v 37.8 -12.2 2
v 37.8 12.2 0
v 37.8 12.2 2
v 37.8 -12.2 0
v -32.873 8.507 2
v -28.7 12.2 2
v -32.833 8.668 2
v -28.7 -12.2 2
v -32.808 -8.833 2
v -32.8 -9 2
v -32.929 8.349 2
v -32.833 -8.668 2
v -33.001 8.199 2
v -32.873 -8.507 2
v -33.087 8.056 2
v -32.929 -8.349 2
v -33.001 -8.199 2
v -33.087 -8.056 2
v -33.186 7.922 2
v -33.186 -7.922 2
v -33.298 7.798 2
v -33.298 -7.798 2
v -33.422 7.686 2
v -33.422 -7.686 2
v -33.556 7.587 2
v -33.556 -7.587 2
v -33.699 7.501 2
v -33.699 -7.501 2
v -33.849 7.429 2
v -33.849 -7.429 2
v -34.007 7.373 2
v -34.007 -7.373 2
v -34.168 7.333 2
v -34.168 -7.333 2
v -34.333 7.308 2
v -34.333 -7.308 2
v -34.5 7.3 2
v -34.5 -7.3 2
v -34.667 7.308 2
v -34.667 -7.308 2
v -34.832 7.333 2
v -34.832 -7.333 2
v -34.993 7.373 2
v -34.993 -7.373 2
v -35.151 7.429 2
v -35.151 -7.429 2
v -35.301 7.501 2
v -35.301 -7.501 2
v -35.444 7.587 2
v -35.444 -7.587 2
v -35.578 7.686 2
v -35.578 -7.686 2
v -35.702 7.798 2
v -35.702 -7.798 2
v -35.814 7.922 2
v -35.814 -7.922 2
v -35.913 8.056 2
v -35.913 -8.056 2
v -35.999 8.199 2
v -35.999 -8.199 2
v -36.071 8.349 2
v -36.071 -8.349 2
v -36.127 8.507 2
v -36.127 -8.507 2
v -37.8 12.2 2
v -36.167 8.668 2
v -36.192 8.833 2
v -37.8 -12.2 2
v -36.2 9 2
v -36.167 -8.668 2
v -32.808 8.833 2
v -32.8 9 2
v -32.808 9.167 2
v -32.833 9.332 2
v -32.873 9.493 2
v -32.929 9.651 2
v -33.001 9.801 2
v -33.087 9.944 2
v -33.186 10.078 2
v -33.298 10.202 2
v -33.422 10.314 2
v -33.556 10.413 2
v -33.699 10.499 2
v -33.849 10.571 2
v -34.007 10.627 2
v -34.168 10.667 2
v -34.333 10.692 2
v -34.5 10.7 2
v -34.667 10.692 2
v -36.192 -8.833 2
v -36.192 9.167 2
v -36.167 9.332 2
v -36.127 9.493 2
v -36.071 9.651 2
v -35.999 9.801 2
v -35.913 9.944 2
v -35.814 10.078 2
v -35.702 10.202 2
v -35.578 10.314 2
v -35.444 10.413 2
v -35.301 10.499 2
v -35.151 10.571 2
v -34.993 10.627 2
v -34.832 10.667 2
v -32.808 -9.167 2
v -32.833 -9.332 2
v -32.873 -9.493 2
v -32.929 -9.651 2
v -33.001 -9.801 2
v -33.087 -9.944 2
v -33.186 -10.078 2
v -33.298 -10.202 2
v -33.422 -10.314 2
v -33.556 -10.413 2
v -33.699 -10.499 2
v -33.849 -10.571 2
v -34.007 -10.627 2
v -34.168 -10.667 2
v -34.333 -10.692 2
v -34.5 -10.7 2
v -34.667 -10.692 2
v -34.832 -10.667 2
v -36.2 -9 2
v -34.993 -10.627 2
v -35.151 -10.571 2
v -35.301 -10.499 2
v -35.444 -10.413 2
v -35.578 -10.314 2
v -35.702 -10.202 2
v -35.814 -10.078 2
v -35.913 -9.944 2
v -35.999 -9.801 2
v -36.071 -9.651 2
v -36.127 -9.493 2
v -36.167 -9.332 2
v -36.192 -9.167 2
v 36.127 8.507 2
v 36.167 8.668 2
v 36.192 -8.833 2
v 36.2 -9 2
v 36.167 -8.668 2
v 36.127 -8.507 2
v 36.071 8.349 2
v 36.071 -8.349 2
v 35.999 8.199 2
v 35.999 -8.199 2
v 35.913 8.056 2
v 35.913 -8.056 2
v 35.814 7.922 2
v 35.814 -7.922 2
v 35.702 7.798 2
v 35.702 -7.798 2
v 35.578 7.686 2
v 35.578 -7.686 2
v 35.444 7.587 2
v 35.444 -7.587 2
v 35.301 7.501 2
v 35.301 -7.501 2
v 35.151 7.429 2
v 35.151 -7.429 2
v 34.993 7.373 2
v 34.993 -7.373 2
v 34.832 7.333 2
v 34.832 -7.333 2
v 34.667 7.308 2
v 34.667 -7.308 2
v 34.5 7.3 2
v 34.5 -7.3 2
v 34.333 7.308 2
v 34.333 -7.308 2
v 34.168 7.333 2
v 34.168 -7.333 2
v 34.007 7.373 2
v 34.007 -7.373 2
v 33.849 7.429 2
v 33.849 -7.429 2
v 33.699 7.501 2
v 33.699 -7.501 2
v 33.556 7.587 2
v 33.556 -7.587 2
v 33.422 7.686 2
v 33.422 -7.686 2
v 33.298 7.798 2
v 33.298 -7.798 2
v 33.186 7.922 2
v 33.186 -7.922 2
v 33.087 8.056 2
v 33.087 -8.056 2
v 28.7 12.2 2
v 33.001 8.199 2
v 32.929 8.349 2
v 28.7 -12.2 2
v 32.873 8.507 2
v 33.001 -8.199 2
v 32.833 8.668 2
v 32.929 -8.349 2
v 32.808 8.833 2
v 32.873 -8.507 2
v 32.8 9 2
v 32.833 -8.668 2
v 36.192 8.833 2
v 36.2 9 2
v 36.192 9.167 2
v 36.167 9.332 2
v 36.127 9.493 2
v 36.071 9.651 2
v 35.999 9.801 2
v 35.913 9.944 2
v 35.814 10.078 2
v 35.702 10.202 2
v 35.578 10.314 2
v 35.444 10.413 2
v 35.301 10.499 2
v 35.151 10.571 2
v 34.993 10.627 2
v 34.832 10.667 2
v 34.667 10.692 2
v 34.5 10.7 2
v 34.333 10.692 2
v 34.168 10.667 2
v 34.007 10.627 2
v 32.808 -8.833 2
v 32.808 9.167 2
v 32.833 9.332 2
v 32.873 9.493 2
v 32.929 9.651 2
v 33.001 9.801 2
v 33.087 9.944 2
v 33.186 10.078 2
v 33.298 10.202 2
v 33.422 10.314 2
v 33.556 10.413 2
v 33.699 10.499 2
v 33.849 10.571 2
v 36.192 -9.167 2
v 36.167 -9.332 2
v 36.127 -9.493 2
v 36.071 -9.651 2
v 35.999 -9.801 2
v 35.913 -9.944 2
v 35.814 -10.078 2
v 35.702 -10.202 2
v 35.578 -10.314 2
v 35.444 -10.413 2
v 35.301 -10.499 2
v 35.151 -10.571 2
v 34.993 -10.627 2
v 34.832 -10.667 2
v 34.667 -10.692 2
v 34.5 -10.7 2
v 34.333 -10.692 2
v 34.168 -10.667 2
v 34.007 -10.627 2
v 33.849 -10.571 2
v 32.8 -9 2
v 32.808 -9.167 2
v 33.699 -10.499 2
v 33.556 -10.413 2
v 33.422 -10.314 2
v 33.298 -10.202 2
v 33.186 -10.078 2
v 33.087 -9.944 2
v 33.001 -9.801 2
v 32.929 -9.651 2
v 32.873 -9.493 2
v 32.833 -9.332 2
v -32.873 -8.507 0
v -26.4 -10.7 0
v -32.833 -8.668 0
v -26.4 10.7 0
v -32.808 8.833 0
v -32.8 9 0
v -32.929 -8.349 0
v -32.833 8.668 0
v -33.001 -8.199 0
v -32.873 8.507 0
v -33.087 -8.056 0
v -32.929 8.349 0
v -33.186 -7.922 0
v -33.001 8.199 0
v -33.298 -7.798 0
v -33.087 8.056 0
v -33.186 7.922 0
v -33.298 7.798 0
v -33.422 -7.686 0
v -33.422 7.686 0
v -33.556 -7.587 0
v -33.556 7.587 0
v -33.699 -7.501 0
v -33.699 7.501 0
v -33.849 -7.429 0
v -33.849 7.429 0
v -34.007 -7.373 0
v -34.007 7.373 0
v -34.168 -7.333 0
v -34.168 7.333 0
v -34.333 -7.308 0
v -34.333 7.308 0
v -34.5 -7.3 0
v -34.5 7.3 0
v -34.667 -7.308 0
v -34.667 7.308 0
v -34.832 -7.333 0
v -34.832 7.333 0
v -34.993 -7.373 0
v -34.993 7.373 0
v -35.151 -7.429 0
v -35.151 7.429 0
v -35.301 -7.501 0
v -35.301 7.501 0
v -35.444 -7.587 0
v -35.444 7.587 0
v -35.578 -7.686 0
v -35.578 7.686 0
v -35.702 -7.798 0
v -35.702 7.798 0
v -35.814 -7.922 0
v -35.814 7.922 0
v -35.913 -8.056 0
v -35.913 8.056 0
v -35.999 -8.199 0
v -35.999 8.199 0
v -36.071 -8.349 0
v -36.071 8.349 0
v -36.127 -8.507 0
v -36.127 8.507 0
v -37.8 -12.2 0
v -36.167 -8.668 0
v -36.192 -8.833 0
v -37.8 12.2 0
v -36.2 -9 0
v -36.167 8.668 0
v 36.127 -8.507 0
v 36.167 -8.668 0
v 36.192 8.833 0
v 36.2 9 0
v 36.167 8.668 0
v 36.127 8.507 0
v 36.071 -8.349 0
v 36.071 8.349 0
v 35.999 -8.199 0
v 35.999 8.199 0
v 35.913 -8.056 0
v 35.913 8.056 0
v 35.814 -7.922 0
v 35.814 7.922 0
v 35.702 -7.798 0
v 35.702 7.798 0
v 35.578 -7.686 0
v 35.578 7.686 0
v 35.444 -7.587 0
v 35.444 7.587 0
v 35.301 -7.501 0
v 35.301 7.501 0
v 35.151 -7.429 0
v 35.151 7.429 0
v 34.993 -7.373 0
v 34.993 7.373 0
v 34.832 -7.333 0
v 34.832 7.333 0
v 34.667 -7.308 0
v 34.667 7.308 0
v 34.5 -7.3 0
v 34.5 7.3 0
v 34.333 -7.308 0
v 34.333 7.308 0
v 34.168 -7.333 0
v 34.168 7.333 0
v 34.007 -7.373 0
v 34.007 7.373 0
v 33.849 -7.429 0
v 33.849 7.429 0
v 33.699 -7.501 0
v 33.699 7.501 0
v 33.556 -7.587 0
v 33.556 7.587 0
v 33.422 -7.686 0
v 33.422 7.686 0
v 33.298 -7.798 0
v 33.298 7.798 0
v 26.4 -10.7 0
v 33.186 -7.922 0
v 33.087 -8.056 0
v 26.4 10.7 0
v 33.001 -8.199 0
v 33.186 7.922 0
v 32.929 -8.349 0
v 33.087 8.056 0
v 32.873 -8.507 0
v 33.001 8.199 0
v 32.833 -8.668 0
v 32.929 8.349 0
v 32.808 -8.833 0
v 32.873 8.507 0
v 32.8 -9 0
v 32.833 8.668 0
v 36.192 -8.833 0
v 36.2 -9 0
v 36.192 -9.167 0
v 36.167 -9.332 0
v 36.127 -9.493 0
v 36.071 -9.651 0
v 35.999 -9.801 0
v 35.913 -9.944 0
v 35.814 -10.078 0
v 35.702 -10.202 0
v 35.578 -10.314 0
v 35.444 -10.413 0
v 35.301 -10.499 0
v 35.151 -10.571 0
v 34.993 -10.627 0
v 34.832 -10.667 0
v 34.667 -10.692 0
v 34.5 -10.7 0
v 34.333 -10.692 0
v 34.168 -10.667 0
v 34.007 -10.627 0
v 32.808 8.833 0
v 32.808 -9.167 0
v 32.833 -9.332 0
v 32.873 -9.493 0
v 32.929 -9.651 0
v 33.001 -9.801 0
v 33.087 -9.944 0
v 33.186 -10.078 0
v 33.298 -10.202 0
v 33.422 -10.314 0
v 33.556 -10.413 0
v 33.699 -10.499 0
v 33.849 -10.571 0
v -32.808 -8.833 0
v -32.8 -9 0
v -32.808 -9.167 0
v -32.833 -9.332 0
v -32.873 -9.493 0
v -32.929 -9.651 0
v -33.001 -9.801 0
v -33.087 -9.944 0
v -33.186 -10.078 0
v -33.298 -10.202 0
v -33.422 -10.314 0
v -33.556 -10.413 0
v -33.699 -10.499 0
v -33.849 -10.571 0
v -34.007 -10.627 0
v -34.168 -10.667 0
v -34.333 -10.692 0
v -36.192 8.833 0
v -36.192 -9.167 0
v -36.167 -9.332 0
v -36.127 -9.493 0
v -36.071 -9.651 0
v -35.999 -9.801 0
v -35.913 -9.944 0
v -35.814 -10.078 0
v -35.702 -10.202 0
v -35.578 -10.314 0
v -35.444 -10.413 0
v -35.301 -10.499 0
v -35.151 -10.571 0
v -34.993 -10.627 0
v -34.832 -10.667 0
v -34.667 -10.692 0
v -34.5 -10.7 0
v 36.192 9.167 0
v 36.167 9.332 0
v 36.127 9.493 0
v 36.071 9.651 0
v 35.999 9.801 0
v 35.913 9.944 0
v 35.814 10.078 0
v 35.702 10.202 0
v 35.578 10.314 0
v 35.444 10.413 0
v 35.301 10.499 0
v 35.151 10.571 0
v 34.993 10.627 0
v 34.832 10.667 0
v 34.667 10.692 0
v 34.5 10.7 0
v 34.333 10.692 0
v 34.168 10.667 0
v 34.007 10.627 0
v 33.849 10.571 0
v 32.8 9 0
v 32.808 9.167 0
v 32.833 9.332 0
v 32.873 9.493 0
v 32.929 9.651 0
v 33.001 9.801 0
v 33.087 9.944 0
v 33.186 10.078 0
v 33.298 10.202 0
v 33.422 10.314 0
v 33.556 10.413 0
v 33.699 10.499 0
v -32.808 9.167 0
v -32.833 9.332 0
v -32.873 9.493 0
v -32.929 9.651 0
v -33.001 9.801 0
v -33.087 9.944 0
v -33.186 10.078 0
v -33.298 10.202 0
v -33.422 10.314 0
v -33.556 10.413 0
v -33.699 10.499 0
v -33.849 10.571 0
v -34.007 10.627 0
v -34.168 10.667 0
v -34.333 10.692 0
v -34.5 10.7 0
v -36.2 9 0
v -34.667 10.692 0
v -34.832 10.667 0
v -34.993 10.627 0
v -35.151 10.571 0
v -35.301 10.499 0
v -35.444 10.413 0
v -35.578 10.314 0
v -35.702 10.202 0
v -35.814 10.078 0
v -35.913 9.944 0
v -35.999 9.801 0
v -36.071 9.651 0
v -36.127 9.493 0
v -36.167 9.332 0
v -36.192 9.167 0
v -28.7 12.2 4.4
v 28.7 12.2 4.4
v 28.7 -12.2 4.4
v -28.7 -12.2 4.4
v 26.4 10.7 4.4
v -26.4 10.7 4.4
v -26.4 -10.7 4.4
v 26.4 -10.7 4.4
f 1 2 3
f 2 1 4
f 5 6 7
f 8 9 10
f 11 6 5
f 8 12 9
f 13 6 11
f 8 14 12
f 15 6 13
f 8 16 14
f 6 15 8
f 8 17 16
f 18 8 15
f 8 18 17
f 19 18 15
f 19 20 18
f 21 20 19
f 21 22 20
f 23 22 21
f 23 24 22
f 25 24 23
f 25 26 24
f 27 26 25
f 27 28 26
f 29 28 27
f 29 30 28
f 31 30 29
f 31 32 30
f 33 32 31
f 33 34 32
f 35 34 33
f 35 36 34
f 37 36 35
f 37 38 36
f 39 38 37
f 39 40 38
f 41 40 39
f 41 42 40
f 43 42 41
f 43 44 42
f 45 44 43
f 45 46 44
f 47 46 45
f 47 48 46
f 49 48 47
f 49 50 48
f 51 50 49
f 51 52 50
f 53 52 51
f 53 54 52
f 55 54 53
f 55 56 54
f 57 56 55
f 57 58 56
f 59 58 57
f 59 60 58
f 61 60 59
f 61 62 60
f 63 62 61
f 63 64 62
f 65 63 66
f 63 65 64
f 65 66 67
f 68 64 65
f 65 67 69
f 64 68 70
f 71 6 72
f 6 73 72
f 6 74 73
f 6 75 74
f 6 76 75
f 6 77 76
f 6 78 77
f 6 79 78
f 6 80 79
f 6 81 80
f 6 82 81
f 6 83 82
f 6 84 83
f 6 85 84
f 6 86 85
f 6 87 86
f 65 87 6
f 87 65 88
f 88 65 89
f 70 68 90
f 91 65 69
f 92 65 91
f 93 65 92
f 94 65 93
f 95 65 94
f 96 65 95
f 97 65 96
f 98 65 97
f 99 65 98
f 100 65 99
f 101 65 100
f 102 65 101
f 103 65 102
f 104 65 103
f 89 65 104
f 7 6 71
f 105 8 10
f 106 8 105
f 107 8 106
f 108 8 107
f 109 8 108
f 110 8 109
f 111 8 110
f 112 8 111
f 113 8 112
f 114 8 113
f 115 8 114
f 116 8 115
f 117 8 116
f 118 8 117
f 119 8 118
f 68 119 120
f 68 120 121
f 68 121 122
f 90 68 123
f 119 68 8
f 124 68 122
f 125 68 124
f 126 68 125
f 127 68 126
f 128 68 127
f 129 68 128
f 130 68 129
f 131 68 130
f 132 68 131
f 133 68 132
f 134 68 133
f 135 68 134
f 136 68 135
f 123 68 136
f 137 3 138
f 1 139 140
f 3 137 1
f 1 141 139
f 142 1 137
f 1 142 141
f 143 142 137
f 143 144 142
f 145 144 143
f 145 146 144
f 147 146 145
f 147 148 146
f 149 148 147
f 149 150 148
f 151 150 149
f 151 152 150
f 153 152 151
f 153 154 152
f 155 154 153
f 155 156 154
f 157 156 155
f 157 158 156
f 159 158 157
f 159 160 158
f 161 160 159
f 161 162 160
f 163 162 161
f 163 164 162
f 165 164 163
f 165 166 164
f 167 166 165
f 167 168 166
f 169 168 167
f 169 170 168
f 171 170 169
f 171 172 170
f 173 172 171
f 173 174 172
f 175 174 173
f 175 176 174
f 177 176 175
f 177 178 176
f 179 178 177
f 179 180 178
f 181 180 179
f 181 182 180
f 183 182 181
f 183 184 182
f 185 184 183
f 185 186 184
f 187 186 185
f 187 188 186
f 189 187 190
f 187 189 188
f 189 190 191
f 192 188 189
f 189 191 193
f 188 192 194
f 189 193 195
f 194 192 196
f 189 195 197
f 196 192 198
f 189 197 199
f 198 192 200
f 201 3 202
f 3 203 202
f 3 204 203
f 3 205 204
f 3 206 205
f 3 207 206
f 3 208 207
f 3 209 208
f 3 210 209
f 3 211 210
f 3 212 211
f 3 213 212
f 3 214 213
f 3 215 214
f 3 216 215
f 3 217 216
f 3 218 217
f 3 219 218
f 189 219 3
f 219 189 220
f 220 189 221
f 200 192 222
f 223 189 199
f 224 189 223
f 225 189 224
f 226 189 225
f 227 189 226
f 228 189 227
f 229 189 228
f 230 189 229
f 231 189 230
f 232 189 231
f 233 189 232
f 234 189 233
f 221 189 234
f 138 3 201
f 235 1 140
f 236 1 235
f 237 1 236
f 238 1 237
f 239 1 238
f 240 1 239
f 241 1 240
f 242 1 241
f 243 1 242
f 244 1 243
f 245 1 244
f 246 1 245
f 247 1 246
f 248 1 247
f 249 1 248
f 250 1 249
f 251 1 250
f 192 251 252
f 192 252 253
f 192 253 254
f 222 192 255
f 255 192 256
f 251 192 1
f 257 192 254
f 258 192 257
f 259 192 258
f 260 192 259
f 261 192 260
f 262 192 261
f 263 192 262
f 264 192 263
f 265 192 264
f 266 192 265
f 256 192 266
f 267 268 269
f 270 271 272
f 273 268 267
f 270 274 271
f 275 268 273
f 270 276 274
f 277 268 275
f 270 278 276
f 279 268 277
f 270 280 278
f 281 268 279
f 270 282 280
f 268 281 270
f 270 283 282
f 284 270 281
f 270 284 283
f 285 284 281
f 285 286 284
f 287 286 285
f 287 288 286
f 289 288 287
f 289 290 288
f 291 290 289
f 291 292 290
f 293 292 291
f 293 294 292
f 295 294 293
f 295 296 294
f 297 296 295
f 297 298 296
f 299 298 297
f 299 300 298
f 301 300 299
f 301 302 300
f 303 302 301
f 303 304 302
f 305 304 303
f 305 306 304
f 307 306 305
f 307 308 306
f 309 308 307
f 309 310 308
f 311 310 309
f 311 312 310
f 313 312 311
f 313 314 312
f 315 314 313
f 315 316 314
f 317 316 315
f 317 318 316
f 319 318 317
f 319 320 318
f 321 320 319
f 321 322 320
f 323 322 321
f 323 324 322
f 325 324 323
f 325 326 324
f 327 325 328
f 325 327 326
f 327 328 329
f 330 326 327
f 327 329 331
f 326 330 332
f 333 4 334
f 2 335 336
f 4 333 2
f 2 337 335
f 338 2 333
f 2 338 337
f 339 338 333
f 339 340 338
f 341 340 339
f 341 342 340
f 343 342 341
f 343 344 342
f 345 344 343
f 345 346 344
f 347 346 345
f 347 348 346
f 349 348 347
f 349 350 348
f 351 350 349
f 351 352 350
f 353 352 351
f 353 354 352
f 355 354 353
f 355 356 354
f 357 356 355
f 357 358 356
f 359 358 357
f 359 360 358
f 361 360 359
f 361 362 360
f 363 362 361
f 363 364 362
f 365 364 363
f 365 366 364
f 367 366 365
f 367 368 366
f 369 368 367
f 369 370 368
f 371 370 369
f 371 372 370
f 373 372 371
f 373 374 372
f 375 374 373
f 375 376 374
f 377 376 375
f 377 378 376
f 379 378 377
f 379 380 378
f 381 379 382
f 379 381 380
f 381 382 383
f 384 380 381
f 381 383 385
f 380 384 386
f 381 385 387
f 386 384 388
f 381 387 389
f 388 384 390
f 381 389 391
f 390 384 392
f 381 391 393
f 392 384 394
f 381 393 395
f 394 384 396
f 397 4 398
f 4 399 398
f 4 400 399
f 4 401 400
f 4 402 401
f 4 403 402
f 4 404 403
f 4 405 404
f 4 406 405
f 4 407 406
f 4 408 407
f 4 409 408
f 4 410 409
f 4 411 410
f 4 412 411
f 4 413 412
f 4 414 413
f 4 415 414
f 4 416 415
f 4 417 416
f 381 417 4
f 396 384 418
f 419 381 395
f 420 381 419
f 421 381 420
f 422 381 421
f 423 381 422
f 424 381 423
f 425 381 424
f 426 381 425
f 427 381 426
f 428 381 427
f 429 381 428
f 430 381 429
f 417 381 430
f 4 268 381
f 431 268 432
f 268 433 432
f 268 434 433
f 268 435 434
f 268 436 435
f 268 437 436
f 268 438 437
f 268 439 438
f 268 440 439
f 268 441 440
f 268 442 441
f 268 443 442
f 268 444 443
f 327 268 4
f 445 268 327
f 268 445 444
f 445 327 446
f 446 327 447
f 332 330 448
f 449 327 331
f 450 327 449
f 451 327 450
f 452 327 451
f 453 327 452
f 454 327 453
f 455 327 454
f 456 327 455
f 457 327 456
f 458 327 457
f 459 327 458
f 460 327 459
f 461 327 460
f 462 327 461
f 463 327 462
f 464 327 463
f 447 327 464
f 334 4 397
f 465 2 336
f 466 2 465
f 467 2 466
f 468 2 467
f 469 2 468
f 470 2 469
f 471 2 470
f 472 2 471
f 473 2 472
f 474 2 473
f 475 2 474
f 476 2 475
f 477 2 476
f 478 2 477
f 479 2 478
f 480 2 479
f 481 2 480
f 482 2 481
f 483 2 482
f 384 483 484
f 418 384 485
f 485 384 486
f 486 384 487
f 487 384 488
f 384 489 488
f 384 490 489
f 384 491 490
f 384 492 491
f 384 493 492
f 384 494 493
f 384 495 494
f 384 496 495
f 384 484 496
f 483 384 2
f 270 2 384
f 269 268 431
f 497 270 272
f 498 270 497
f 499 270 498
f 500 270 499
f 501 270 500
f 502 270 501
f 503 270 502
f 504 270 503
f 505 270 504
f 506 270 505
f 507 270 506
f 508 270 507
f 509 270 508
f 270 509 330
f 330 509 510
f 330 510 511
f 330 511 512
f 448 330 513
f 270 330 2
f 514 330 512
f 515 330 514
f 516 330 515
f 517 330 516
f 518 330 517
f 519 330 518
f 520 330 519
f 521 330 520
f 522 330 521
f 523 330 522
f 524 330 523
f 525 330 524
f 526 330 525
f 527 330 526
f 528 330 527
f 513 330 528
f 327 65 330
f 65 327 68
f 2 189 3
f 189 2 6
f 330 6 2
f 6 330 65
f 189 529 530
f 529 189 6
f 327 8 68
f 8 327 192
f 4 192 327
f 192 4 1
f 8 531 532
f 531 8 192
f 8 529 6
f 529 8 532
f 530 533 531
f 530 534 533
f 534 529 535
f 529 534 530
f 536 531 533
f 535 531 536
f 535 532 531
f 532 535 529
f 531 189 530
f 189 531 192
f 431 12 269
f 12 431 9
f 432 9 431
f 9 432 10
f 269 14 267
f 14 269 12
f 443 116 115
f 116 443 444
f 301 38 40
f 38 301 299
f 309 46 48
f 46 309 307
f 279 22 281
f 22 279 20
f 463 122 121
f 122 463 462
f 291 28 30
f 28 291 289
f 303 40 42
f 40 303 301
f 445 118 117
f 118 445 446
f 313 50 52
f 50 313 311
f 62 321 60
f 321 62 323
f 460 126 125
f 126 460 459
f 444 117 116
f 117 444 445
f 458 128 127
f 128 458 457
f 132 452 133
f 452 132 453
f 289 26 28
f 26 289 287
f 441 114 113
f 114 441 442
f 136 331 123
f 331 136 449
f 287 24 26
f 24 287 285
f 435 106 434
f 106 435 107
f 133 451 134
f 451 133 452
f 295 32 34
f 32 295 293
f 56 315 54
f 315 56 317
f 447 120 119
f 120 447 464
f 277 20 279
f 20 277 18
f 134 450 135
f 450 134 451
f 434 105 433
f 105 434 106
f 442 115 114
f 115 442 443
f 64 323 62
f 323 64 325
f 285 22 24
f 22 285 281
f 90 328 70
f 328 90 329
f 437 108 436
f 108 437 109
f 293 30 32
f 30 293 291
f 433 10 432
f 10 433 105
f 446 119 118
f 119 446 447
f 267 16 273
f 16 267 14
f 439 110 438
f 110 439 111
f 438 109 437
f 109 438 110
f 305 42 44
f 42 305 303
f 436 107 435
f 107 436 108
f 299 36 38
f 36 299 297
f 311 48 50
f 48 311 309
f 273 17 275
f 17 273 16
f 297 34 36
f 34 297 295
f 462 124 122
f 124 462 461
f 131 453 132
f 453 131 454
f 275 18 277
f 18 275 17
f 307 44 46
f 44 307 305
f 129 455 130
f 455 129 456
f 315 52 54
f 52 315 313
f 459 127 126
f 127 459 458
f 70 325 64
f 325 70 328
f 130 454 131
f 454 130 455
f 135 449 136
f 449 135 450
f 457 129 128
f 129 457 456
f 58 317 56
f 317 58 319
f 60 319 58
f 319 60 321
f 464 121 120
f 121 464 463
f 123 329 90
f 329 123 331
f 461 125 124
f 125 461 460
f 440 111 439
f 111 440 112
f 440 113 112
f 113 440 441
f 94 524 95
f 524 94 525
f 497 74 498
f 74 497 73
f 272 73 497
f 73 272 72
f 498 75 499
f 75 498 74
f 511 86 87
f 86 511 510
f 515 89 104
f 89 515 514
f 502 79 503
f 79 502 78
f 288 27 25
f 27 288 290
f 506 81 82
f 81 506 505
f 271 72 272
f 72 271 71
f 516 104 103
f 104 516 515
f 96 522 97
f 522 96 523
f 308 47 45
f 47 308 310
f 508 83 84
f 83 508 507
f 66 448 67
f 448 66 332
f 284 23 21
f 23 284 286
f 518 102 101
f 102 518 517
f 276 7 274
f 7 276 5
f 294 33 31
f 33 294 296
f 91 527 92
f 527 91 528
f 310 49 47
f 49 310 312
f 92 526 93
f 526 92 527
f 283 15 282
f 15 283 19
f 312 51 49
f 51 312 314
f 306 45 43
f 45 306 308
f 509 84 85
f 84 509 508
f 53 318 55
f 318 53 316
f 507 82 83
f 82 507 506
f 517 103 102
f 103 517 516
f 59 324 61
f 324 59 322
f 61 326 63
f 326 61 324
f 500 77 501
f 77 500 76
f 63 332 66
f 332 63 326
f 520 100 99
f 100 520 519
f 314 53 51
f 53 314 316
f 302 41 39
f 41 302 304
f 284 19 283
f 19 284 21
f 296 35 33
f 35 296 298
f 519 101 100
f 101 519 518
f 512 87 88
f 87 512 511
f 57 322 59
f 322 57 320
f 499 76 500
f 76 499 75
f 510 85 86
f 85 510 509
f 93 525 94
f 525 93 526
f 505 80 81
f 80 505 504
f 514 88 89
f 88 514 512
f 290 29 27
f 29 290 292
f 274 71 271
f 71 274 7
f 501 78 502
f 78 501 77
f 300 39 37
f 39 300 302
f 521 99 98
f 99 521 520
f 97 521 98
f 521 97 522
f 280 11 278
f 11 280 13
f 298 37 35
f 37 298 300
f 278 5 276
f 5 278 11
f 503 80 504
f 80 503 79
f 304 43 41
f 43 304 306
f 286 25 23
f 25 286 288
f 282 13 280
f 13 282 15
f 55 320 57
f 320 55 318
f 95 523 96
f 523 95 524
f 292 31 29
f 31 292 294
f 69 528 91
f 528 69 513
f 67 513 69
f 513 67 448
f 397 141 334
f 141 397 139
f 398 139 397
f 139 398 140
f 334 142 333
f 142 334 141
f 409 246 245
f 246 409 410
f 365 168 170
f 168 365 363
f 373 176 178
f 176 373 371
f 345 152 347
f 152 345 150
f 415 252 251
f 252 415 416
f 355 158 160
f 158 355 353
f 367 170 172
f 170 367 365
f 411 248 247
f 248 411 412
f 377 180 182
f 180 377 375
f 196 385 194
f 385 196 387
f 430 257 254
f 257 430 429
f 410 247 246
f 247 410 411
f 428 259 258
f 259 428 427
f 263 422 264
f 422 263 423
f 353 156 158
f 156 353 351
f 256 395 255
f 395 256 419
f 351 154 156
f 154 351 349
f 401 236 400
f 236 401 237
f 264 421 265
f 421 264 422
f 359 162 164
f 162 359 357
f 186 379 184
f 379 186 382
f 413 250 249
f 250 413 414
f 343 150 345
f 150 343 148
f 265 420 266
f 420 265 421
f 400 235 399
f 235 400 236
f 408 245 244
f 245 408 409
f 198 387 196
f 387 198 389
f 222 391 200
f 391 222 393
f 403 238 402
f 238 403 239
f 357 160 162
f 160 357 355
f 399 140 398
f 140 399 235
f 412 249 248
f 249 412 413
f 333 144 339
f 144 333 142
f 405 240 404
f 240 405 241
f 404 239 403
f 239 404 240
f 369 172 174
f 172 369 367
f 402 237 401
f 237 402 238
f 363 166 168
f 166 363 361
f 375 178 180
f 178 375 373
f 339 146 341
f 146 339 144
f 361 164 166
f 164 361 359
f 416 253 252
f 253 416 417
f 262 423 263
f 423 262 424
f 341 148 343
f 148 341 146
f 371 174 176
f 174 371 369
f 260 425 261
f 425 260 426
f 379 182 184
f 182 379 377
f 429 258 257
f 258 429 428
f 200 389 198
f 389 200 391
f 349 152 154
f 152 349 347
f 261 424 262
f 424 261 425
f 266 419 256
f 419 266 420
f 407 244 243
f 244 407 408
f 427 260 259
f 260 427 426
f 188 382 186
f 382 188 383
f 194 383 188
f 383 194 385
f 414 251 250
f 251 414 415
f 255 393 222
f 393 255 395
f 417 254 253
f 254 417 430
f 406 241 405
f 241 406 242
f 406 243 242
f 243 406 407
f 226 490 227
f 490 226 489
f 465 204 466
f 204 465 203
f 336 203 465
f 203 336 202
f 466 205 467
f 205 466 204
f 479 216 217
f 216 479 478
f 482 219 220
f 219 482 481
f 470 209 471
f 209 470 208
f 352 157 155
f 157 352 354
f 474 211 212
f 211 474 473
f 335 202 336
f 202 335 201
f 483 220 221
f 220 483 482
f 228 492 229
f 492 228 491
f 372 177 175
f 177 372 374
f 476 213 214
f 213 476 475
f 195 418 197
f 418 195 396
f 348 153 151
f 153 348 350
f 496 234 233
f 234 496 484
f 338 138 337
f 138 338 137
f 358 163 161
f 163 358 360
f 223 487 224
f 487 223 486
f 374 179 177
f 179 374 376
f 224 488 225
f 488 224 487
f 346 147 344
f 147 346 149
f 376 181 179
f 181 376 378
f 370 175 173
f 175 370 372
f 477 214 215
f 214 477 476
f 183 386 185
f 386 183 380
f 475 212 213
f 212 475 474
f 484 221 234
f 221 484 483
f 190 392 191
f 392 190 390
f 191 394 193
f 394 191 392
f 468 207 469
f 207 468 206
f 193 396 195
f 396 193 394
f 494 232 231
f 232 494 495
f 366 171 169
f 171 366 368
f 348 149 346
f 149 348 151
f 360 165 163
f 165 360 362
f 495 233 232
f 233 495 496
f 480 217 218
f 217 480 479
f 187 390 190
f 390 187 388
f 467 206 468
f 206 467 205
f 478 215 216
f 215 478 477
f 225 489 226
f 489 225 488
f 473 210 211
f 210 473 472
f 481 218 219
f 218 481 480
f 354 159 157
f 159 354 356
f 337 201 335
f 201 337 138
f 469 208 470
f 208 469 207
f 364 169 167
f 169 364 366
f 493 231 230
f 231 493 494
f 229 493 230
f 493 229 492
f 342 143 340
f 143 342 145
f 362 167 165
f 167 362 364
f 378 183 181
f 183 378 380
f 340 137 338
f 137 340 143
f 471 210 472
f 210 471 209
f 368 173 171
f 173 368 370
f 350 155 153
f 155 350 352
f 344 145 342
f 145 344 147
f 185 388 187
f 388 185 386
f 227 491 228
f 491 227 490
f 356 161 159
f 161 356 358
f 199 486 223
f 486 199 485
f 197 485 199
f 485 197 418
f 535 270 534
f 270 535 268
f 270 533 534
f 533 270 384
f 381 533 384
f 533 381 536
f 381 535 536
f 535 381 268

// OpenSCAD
// Busy board enclosure - v2 DS1 window retainer
// Render this file to generate busy_board_window_retainer.stl: it clamps the
// clear display pane into the printed plate from behind.

include <_busy_board_enclosure.scad>

board_v3 = false;     // v2.0 board, 222 mm square
busy_board_window_retainer();
